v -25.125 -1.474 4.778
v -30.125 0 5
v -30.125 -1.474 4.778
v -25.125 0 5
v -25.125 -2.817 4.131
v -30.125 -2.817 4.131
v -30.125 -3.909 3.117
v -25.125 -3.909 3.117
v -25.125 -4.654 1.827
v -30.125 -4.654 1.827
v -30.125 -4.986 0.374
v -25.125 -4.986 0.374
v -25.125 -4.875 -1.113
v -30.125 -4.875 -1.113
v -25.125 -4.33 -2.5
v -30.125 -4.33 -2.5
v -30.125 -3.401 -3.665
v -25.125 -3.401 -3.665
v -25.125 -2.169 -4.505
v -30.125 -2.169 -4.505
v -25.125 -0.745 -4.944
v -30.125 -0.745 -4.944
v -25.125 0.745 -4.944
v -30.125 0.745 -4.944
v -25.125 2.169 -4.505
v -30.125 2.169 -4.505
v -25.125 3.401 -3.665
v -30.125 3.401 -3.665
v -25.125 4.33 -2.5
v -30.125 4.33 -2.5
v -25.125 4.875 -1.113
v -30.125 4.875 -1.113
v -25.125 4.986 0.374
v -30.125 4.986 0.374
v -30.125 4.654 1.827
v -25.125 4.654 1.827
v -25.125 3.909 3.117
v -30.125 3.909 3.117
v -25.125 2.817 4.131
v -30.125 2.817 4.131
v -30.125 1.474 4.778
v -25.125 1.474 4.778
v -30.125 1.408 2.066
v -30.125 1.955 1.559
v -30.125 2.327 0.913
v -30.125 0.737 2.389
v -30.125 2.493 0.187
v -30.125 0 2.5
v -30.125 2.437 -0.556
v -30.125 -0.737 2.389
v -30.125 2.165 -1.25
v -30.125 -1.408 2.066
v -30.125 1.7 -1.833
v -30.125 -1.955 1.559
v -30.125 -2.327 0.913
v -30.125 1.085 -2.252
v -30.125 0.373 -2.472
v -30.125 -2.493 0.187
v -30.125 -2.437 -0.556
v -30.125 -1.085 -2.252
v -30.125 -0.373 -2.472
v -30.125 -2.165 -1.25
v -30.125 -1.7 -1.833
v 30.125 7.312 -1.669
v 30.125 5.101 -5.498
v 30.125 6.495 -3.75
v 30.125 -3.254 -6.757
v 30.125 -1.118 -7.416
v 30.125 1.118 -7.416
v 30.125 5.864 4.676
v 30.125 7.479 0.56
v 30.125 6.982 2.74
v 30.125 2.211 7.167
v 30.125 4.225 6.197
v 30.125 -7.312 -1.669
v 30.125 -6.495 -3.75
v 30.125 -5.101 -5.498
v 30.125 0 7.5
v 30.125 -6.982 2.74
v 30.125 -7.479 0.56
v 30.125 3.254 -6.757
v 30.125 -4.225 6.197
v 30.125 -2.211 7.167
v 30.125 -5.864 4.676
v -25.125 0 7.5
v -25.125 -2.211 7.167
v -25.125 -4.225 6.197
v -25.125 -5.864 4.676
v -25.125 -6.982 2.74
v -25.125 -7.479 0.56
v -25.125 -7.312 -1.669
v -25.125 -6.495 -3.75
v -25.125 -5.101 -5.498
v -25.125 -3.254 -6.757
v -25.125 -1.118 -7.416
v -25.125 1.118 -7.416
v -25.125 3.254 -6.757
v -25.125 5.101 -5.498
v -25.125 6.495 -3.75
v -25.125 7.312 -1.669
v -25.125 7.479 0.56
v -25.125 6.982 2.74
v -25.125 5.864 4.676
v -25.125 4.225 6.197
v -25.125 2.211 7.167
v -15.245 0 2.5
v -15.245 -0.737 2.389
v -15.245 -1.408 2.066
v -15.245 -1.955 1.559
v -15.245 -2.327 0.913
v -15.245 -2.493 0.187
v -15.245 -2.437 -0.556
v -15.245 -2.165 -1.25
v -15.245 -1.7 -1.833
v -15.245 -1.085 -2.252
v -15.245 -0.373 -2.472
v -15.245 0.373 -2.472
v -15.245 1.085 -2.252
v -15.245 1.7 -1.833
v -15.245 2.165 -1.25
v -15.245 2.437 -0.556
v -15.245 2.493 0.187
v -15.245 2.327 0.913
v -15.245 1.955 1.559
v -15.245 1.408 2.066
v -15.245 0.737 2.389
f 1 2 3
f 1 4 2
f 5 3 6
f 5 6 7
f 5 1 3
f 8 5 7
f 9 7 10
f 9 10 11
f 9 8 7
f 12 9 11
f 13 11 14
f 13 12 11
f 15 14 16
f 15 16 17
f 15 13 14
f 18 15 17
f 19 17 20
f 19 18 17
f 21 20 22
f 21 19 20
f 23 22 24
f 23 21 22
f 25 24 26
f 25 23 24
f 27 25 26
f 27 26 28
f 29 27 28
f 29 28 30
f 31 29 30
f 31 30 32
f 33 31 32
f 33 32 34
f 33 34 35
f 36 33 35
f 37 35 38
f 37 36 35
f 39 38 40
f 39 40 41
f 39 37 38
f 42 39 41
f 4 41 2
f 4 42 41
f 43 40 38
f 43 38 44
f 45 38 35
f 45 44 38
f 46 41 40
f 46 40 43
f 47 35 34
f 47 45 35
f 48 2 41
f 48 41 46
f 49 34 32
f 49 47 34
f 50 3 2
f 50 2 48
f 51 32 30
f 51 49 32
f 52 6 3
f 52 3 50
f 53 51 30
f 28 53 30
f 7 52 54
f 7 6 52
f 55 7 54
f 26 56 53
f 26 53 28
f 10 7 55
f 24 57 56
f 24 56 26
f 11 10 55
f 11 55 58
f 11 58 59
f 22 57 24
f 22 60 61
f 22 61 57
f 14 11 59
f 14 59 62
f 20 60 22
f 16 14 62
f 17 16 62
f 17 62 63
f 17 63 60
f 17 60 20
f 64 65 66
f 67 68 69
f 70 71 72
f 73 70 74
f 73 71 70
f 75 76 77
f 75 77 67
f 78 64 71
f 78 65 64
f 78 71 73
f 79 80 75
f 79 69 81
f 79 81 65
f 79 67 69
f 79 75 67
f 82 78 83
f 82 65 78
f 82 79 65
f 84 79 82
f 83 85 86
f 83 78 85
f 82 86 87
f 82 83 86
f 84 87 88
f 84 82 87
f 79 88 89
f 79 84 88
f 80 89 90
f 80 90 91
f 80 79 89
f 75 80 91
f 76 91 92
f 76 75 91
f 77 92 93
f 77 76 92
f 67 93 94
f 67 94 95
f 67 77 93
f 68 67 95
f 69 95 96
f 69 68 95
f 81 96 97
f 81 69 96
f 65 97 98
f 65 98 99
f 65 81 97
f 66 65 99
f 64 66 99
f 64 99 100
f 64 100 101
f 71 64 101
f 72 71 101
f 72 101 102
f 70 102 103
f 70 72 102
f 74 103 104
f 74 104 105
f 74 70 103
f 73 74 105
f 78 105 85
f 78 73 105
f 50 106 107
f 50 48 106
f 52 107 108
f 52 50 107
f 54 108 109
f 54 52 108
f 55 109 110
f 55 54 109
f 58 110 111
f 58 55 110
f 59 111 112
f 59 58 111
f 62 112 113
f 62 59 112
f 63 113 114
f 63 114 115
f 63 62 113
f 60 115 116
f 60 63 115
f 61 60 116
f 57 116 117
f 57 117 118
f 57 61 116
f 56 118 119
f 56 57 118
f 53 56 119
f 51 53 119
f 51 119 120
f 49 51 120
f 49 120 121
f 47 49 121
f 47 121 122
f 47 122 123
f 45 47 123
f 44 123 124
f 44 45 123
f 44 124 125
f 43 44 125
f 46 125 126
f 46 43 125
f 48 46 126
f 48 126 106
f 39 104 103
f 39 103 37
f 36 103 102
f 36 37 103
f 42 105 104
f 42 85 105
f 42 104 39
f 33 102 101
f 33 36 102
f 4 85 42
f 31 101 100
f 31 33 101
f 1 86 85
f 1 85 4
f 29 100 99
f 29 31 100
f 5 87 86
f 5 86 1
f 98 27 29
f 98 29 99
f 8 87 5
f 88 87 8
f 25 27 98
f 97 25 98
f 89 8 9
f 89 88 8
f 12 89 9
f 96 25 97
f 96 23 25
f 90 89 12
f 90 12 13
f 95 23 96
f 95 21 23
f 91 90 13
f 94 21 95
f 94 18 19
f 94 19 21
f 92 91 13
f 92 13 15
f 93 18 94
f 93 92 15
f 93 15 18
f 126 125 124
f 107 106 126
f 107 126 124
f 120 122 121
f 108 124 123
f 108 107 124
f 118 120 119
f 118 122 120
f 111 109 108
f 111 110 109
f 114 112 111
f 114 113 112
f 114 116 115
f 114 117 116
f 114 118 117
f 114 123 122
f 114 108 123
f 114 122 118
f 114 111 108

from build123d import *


with BuildPart() as part:
    # Esboço1 → Revolução1 (revolve)
    with BuildSketch(Plane.XY, mode=Mode.PRIVATE) as revolu_o1_sk:
        Polygon((-15.245, 0), (-15.245, 2.5), (-30.125, 2.5), (-30.125, 5), (-25.125, 5), (-25.125, 7.5), (30.125, 7.5), (30.125, 0), align=None)
    revolve(revolu_o1_sk.sketch.rotate(Axis((0, 0, 0), (1, 0, 0)), 90), axis=Axis((0, 0, 0), (1, 0, 0)))


solid = part.part
